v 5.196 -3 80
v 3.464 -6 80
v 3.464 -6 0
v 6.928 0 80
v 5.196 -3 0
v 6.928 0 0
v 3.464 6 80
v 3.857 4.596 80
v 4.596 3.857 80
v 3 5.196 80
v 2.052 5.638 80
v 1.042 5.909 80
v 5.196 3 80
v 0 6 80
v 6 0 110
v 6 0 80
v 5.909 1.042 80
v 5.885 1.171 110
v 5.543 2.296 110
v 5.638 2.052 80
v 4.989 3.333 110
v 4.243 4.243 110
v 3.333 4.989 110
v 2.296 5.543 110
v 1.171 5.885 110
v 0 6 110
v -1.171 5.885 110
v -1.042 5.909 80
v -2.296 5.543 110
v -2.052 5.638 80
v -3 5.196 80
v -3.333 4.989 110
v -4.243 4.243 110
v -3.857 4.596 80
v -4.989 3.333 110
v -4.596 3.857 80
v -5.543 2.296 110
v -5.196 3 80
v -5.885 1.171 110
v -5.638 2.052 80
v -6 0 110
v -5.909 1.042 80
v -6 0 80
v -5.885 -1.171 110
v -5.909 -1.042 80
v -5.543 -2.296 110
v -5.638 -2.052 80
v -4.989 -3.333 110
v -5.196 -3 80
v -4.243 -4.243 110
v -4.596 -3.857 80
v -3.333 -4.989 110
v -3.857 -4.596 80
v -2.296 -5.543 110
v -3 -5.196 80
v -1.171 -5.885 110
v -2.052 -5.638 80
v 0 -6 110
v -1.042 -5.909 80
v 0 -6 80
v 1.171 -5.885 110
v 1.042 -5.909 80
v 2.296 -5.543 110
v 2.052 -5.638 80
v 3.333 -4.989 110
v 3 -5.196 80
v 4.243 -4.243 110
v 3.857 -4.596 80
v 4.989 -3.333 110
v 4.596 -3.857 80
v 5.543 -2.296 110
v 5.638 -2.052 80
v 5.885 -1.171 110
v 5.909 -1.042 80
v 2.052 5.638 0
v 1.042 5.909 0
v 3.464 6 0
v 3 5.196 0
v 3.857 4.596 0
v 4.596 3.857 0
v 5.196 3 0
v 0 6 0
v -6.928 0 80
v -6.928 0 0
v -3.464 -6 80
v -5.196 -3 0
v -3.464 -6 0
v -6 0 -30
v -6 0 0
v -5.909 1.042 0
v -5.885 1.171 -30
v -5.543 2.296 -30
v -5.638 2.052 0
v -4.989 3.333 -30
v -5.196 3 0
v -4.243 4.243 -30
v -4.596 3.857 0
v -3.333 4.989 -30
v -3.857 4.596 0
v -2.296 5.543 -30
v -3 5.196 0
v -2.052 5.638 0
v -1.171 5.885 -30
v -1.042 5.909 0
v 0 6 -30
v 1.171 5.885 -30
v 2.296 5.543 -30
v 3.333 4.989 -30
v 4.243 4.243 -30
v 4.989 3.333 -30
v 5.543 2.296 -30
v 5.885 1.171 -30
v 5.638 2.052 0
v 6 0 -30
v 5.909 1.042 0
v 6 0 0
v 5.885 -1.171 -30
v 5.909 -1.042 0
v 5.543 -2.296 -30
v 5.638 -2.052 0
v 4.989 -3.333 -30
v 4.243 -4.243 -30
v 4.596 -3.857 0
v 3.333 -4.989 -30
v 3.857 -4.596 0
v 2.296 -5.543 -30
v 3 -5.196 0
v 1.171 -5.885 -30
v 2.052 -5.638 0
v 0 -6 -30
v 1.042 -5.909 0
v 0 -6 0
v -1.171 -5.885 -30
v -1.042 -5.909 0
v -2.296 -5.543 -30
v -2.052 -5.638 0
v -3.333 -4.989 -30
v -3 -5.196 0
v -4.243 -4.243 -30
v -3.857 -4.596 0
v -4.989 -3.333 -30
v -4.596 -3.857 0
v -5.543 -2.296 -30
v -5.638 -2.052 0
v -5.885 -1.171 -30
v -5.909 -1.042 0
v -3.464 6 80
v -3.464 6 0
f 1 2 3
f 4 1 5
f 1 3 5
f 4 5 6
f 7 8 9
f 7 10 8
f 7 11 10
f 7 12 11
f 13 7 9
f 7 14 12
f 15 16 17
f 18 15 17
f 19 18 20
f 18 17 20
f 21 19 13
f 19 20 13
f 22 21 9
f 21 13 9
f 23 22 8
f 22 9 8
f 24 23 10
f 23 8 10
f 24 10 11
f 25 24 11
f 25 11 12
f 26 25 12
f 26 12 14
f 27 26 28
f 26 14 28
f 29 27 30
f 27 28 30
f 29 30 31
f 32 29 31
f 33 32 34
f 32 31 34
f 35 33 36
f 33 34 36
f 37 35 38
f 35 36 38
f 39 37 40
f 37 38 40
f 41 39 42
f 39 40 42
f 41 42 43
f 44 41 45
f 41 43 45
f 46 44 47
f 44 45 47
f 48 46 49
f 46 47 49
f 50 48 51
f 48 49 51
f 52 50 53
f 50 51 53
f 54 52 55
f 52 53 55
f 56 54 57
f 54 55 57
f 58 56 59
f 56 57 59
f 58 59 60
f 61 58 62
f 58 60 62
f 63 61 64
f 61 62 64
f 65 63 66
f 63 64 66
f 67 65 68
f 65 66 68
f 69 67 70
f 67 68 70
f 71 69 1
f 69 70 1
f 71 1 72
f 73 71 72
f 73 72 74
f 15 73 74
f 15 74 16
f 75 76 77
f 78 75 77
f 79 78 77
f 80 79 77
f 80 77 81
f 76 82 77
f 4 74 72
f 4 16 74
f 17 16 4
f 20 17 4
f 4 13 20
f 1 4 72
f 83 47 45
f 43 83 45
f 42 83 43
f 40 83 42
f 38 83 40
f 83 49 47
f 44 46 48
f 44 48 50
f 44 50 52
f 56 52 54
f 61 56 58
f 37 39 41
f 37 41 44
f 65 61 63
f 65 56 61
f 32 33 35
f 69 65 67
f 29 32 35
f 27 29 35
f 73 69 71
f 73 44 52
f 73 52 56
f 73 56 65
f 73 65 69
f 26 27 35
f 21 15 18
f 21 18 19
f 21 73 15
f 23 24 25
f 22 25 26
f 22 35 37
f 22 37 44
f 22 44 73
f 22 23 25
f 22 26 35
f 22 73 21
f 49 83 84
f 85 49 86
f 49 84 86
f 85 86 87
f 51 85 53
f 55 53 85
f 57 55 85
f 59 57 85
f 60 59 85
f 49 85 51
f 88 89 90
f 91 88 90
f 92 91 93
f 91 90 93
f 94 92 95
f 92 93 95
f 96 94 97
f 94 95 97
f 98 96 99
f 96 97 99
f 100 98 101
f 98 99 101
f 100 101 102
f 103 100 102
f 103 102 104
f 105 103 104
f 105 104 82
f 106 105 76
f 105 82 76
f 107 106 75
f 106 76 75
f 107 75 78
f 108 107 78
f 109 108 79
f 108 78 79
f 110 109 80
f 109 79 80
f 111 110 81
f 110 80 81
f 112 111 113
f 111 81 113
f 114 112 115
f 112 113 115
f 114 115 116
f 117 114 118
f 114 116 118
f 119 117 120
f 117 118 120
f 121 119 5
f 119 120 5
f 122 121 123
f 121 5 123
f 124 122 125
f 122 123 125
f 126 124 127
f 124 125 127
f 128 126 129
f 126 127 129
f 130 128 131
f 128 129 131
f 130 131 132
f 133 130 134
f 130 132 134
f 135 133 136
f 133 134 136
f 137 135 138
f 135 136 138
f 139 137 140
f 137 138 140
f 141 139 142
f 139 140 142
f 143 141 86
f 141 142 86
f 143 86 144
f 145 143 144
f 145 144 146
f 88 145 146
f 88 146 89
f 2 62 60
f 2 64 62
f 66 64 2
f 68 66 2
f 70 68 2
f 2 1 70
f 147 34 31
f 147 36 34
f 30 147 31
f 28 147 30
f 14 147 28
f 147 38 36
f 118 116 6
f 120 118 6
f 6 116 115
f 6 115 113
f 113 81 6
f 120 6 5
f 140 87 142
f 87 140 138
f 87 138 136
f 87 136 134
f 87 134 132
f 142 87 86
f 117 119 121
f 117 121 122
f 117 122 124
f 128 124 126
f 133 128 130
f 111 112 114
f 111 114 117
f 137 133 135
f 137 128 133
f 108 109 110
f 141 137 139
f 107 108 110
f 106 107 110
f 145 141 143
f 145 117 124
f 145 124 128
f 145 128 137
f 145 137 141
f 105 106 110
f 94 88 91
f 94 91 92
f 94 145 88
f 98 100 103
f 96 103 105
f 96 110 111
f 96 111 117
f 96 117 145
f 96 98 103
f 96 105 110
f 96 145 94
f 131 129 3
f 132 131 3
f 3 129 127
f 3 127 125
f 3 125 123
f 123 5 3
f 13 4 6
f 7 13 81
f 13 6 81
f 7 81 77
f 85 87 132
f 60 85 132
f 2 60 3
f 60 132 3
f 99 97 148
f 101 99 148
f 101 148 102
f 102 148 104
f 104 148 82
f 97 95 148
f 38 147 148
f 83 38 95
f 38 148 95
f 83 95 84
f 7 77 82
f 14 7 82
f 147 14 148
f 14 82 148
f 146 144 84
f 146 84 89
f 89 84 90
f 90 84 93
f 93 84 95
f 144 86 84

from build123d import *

# Parameters (mm, degrees)
BOSS_EXTRUDE1_DEPTH = 80
SKETCH2_R           = 6
BOSS_EXTRUDE2_DEPTH = 30
SKETCH3_R           = 6
BOSS_EXTRUDE3_DEPTH = 30


with BuildPart() as part:
    # Sketch1 → Boss-Extrude1 (new body)
    with BuildSketch(Plane.XY):
        Polygon((3.464101615, 6), (-3.464101615, 6), (-6.92820323, 0), (-3.464101615, -6), (3.464101615, -6), (6.92820323, 0), align=None)
    extrude(amount=BOSS_EXTRUDE1_DEPTH)

    # Sketch2 → Boss-Extrude2 (add)
    with BuildSketch(Plane.XY.offset(80)):
        Circle(SKETCH2_R)
    extrude(amount=BOSS_EXTRUDE2_DEPTH)

    # Sketch3 → Boss-Extrude3 (add)
    with BuildSketch(Plane(origin=(0, 0, 0), x_dir=(-1, 0, 0), z_dir=(0, 0, -1))):
        Circle(SKETCH3_R)
    extrude(amount=BOSS_EXTRUDE3_DEPTH)


solid = part.part
